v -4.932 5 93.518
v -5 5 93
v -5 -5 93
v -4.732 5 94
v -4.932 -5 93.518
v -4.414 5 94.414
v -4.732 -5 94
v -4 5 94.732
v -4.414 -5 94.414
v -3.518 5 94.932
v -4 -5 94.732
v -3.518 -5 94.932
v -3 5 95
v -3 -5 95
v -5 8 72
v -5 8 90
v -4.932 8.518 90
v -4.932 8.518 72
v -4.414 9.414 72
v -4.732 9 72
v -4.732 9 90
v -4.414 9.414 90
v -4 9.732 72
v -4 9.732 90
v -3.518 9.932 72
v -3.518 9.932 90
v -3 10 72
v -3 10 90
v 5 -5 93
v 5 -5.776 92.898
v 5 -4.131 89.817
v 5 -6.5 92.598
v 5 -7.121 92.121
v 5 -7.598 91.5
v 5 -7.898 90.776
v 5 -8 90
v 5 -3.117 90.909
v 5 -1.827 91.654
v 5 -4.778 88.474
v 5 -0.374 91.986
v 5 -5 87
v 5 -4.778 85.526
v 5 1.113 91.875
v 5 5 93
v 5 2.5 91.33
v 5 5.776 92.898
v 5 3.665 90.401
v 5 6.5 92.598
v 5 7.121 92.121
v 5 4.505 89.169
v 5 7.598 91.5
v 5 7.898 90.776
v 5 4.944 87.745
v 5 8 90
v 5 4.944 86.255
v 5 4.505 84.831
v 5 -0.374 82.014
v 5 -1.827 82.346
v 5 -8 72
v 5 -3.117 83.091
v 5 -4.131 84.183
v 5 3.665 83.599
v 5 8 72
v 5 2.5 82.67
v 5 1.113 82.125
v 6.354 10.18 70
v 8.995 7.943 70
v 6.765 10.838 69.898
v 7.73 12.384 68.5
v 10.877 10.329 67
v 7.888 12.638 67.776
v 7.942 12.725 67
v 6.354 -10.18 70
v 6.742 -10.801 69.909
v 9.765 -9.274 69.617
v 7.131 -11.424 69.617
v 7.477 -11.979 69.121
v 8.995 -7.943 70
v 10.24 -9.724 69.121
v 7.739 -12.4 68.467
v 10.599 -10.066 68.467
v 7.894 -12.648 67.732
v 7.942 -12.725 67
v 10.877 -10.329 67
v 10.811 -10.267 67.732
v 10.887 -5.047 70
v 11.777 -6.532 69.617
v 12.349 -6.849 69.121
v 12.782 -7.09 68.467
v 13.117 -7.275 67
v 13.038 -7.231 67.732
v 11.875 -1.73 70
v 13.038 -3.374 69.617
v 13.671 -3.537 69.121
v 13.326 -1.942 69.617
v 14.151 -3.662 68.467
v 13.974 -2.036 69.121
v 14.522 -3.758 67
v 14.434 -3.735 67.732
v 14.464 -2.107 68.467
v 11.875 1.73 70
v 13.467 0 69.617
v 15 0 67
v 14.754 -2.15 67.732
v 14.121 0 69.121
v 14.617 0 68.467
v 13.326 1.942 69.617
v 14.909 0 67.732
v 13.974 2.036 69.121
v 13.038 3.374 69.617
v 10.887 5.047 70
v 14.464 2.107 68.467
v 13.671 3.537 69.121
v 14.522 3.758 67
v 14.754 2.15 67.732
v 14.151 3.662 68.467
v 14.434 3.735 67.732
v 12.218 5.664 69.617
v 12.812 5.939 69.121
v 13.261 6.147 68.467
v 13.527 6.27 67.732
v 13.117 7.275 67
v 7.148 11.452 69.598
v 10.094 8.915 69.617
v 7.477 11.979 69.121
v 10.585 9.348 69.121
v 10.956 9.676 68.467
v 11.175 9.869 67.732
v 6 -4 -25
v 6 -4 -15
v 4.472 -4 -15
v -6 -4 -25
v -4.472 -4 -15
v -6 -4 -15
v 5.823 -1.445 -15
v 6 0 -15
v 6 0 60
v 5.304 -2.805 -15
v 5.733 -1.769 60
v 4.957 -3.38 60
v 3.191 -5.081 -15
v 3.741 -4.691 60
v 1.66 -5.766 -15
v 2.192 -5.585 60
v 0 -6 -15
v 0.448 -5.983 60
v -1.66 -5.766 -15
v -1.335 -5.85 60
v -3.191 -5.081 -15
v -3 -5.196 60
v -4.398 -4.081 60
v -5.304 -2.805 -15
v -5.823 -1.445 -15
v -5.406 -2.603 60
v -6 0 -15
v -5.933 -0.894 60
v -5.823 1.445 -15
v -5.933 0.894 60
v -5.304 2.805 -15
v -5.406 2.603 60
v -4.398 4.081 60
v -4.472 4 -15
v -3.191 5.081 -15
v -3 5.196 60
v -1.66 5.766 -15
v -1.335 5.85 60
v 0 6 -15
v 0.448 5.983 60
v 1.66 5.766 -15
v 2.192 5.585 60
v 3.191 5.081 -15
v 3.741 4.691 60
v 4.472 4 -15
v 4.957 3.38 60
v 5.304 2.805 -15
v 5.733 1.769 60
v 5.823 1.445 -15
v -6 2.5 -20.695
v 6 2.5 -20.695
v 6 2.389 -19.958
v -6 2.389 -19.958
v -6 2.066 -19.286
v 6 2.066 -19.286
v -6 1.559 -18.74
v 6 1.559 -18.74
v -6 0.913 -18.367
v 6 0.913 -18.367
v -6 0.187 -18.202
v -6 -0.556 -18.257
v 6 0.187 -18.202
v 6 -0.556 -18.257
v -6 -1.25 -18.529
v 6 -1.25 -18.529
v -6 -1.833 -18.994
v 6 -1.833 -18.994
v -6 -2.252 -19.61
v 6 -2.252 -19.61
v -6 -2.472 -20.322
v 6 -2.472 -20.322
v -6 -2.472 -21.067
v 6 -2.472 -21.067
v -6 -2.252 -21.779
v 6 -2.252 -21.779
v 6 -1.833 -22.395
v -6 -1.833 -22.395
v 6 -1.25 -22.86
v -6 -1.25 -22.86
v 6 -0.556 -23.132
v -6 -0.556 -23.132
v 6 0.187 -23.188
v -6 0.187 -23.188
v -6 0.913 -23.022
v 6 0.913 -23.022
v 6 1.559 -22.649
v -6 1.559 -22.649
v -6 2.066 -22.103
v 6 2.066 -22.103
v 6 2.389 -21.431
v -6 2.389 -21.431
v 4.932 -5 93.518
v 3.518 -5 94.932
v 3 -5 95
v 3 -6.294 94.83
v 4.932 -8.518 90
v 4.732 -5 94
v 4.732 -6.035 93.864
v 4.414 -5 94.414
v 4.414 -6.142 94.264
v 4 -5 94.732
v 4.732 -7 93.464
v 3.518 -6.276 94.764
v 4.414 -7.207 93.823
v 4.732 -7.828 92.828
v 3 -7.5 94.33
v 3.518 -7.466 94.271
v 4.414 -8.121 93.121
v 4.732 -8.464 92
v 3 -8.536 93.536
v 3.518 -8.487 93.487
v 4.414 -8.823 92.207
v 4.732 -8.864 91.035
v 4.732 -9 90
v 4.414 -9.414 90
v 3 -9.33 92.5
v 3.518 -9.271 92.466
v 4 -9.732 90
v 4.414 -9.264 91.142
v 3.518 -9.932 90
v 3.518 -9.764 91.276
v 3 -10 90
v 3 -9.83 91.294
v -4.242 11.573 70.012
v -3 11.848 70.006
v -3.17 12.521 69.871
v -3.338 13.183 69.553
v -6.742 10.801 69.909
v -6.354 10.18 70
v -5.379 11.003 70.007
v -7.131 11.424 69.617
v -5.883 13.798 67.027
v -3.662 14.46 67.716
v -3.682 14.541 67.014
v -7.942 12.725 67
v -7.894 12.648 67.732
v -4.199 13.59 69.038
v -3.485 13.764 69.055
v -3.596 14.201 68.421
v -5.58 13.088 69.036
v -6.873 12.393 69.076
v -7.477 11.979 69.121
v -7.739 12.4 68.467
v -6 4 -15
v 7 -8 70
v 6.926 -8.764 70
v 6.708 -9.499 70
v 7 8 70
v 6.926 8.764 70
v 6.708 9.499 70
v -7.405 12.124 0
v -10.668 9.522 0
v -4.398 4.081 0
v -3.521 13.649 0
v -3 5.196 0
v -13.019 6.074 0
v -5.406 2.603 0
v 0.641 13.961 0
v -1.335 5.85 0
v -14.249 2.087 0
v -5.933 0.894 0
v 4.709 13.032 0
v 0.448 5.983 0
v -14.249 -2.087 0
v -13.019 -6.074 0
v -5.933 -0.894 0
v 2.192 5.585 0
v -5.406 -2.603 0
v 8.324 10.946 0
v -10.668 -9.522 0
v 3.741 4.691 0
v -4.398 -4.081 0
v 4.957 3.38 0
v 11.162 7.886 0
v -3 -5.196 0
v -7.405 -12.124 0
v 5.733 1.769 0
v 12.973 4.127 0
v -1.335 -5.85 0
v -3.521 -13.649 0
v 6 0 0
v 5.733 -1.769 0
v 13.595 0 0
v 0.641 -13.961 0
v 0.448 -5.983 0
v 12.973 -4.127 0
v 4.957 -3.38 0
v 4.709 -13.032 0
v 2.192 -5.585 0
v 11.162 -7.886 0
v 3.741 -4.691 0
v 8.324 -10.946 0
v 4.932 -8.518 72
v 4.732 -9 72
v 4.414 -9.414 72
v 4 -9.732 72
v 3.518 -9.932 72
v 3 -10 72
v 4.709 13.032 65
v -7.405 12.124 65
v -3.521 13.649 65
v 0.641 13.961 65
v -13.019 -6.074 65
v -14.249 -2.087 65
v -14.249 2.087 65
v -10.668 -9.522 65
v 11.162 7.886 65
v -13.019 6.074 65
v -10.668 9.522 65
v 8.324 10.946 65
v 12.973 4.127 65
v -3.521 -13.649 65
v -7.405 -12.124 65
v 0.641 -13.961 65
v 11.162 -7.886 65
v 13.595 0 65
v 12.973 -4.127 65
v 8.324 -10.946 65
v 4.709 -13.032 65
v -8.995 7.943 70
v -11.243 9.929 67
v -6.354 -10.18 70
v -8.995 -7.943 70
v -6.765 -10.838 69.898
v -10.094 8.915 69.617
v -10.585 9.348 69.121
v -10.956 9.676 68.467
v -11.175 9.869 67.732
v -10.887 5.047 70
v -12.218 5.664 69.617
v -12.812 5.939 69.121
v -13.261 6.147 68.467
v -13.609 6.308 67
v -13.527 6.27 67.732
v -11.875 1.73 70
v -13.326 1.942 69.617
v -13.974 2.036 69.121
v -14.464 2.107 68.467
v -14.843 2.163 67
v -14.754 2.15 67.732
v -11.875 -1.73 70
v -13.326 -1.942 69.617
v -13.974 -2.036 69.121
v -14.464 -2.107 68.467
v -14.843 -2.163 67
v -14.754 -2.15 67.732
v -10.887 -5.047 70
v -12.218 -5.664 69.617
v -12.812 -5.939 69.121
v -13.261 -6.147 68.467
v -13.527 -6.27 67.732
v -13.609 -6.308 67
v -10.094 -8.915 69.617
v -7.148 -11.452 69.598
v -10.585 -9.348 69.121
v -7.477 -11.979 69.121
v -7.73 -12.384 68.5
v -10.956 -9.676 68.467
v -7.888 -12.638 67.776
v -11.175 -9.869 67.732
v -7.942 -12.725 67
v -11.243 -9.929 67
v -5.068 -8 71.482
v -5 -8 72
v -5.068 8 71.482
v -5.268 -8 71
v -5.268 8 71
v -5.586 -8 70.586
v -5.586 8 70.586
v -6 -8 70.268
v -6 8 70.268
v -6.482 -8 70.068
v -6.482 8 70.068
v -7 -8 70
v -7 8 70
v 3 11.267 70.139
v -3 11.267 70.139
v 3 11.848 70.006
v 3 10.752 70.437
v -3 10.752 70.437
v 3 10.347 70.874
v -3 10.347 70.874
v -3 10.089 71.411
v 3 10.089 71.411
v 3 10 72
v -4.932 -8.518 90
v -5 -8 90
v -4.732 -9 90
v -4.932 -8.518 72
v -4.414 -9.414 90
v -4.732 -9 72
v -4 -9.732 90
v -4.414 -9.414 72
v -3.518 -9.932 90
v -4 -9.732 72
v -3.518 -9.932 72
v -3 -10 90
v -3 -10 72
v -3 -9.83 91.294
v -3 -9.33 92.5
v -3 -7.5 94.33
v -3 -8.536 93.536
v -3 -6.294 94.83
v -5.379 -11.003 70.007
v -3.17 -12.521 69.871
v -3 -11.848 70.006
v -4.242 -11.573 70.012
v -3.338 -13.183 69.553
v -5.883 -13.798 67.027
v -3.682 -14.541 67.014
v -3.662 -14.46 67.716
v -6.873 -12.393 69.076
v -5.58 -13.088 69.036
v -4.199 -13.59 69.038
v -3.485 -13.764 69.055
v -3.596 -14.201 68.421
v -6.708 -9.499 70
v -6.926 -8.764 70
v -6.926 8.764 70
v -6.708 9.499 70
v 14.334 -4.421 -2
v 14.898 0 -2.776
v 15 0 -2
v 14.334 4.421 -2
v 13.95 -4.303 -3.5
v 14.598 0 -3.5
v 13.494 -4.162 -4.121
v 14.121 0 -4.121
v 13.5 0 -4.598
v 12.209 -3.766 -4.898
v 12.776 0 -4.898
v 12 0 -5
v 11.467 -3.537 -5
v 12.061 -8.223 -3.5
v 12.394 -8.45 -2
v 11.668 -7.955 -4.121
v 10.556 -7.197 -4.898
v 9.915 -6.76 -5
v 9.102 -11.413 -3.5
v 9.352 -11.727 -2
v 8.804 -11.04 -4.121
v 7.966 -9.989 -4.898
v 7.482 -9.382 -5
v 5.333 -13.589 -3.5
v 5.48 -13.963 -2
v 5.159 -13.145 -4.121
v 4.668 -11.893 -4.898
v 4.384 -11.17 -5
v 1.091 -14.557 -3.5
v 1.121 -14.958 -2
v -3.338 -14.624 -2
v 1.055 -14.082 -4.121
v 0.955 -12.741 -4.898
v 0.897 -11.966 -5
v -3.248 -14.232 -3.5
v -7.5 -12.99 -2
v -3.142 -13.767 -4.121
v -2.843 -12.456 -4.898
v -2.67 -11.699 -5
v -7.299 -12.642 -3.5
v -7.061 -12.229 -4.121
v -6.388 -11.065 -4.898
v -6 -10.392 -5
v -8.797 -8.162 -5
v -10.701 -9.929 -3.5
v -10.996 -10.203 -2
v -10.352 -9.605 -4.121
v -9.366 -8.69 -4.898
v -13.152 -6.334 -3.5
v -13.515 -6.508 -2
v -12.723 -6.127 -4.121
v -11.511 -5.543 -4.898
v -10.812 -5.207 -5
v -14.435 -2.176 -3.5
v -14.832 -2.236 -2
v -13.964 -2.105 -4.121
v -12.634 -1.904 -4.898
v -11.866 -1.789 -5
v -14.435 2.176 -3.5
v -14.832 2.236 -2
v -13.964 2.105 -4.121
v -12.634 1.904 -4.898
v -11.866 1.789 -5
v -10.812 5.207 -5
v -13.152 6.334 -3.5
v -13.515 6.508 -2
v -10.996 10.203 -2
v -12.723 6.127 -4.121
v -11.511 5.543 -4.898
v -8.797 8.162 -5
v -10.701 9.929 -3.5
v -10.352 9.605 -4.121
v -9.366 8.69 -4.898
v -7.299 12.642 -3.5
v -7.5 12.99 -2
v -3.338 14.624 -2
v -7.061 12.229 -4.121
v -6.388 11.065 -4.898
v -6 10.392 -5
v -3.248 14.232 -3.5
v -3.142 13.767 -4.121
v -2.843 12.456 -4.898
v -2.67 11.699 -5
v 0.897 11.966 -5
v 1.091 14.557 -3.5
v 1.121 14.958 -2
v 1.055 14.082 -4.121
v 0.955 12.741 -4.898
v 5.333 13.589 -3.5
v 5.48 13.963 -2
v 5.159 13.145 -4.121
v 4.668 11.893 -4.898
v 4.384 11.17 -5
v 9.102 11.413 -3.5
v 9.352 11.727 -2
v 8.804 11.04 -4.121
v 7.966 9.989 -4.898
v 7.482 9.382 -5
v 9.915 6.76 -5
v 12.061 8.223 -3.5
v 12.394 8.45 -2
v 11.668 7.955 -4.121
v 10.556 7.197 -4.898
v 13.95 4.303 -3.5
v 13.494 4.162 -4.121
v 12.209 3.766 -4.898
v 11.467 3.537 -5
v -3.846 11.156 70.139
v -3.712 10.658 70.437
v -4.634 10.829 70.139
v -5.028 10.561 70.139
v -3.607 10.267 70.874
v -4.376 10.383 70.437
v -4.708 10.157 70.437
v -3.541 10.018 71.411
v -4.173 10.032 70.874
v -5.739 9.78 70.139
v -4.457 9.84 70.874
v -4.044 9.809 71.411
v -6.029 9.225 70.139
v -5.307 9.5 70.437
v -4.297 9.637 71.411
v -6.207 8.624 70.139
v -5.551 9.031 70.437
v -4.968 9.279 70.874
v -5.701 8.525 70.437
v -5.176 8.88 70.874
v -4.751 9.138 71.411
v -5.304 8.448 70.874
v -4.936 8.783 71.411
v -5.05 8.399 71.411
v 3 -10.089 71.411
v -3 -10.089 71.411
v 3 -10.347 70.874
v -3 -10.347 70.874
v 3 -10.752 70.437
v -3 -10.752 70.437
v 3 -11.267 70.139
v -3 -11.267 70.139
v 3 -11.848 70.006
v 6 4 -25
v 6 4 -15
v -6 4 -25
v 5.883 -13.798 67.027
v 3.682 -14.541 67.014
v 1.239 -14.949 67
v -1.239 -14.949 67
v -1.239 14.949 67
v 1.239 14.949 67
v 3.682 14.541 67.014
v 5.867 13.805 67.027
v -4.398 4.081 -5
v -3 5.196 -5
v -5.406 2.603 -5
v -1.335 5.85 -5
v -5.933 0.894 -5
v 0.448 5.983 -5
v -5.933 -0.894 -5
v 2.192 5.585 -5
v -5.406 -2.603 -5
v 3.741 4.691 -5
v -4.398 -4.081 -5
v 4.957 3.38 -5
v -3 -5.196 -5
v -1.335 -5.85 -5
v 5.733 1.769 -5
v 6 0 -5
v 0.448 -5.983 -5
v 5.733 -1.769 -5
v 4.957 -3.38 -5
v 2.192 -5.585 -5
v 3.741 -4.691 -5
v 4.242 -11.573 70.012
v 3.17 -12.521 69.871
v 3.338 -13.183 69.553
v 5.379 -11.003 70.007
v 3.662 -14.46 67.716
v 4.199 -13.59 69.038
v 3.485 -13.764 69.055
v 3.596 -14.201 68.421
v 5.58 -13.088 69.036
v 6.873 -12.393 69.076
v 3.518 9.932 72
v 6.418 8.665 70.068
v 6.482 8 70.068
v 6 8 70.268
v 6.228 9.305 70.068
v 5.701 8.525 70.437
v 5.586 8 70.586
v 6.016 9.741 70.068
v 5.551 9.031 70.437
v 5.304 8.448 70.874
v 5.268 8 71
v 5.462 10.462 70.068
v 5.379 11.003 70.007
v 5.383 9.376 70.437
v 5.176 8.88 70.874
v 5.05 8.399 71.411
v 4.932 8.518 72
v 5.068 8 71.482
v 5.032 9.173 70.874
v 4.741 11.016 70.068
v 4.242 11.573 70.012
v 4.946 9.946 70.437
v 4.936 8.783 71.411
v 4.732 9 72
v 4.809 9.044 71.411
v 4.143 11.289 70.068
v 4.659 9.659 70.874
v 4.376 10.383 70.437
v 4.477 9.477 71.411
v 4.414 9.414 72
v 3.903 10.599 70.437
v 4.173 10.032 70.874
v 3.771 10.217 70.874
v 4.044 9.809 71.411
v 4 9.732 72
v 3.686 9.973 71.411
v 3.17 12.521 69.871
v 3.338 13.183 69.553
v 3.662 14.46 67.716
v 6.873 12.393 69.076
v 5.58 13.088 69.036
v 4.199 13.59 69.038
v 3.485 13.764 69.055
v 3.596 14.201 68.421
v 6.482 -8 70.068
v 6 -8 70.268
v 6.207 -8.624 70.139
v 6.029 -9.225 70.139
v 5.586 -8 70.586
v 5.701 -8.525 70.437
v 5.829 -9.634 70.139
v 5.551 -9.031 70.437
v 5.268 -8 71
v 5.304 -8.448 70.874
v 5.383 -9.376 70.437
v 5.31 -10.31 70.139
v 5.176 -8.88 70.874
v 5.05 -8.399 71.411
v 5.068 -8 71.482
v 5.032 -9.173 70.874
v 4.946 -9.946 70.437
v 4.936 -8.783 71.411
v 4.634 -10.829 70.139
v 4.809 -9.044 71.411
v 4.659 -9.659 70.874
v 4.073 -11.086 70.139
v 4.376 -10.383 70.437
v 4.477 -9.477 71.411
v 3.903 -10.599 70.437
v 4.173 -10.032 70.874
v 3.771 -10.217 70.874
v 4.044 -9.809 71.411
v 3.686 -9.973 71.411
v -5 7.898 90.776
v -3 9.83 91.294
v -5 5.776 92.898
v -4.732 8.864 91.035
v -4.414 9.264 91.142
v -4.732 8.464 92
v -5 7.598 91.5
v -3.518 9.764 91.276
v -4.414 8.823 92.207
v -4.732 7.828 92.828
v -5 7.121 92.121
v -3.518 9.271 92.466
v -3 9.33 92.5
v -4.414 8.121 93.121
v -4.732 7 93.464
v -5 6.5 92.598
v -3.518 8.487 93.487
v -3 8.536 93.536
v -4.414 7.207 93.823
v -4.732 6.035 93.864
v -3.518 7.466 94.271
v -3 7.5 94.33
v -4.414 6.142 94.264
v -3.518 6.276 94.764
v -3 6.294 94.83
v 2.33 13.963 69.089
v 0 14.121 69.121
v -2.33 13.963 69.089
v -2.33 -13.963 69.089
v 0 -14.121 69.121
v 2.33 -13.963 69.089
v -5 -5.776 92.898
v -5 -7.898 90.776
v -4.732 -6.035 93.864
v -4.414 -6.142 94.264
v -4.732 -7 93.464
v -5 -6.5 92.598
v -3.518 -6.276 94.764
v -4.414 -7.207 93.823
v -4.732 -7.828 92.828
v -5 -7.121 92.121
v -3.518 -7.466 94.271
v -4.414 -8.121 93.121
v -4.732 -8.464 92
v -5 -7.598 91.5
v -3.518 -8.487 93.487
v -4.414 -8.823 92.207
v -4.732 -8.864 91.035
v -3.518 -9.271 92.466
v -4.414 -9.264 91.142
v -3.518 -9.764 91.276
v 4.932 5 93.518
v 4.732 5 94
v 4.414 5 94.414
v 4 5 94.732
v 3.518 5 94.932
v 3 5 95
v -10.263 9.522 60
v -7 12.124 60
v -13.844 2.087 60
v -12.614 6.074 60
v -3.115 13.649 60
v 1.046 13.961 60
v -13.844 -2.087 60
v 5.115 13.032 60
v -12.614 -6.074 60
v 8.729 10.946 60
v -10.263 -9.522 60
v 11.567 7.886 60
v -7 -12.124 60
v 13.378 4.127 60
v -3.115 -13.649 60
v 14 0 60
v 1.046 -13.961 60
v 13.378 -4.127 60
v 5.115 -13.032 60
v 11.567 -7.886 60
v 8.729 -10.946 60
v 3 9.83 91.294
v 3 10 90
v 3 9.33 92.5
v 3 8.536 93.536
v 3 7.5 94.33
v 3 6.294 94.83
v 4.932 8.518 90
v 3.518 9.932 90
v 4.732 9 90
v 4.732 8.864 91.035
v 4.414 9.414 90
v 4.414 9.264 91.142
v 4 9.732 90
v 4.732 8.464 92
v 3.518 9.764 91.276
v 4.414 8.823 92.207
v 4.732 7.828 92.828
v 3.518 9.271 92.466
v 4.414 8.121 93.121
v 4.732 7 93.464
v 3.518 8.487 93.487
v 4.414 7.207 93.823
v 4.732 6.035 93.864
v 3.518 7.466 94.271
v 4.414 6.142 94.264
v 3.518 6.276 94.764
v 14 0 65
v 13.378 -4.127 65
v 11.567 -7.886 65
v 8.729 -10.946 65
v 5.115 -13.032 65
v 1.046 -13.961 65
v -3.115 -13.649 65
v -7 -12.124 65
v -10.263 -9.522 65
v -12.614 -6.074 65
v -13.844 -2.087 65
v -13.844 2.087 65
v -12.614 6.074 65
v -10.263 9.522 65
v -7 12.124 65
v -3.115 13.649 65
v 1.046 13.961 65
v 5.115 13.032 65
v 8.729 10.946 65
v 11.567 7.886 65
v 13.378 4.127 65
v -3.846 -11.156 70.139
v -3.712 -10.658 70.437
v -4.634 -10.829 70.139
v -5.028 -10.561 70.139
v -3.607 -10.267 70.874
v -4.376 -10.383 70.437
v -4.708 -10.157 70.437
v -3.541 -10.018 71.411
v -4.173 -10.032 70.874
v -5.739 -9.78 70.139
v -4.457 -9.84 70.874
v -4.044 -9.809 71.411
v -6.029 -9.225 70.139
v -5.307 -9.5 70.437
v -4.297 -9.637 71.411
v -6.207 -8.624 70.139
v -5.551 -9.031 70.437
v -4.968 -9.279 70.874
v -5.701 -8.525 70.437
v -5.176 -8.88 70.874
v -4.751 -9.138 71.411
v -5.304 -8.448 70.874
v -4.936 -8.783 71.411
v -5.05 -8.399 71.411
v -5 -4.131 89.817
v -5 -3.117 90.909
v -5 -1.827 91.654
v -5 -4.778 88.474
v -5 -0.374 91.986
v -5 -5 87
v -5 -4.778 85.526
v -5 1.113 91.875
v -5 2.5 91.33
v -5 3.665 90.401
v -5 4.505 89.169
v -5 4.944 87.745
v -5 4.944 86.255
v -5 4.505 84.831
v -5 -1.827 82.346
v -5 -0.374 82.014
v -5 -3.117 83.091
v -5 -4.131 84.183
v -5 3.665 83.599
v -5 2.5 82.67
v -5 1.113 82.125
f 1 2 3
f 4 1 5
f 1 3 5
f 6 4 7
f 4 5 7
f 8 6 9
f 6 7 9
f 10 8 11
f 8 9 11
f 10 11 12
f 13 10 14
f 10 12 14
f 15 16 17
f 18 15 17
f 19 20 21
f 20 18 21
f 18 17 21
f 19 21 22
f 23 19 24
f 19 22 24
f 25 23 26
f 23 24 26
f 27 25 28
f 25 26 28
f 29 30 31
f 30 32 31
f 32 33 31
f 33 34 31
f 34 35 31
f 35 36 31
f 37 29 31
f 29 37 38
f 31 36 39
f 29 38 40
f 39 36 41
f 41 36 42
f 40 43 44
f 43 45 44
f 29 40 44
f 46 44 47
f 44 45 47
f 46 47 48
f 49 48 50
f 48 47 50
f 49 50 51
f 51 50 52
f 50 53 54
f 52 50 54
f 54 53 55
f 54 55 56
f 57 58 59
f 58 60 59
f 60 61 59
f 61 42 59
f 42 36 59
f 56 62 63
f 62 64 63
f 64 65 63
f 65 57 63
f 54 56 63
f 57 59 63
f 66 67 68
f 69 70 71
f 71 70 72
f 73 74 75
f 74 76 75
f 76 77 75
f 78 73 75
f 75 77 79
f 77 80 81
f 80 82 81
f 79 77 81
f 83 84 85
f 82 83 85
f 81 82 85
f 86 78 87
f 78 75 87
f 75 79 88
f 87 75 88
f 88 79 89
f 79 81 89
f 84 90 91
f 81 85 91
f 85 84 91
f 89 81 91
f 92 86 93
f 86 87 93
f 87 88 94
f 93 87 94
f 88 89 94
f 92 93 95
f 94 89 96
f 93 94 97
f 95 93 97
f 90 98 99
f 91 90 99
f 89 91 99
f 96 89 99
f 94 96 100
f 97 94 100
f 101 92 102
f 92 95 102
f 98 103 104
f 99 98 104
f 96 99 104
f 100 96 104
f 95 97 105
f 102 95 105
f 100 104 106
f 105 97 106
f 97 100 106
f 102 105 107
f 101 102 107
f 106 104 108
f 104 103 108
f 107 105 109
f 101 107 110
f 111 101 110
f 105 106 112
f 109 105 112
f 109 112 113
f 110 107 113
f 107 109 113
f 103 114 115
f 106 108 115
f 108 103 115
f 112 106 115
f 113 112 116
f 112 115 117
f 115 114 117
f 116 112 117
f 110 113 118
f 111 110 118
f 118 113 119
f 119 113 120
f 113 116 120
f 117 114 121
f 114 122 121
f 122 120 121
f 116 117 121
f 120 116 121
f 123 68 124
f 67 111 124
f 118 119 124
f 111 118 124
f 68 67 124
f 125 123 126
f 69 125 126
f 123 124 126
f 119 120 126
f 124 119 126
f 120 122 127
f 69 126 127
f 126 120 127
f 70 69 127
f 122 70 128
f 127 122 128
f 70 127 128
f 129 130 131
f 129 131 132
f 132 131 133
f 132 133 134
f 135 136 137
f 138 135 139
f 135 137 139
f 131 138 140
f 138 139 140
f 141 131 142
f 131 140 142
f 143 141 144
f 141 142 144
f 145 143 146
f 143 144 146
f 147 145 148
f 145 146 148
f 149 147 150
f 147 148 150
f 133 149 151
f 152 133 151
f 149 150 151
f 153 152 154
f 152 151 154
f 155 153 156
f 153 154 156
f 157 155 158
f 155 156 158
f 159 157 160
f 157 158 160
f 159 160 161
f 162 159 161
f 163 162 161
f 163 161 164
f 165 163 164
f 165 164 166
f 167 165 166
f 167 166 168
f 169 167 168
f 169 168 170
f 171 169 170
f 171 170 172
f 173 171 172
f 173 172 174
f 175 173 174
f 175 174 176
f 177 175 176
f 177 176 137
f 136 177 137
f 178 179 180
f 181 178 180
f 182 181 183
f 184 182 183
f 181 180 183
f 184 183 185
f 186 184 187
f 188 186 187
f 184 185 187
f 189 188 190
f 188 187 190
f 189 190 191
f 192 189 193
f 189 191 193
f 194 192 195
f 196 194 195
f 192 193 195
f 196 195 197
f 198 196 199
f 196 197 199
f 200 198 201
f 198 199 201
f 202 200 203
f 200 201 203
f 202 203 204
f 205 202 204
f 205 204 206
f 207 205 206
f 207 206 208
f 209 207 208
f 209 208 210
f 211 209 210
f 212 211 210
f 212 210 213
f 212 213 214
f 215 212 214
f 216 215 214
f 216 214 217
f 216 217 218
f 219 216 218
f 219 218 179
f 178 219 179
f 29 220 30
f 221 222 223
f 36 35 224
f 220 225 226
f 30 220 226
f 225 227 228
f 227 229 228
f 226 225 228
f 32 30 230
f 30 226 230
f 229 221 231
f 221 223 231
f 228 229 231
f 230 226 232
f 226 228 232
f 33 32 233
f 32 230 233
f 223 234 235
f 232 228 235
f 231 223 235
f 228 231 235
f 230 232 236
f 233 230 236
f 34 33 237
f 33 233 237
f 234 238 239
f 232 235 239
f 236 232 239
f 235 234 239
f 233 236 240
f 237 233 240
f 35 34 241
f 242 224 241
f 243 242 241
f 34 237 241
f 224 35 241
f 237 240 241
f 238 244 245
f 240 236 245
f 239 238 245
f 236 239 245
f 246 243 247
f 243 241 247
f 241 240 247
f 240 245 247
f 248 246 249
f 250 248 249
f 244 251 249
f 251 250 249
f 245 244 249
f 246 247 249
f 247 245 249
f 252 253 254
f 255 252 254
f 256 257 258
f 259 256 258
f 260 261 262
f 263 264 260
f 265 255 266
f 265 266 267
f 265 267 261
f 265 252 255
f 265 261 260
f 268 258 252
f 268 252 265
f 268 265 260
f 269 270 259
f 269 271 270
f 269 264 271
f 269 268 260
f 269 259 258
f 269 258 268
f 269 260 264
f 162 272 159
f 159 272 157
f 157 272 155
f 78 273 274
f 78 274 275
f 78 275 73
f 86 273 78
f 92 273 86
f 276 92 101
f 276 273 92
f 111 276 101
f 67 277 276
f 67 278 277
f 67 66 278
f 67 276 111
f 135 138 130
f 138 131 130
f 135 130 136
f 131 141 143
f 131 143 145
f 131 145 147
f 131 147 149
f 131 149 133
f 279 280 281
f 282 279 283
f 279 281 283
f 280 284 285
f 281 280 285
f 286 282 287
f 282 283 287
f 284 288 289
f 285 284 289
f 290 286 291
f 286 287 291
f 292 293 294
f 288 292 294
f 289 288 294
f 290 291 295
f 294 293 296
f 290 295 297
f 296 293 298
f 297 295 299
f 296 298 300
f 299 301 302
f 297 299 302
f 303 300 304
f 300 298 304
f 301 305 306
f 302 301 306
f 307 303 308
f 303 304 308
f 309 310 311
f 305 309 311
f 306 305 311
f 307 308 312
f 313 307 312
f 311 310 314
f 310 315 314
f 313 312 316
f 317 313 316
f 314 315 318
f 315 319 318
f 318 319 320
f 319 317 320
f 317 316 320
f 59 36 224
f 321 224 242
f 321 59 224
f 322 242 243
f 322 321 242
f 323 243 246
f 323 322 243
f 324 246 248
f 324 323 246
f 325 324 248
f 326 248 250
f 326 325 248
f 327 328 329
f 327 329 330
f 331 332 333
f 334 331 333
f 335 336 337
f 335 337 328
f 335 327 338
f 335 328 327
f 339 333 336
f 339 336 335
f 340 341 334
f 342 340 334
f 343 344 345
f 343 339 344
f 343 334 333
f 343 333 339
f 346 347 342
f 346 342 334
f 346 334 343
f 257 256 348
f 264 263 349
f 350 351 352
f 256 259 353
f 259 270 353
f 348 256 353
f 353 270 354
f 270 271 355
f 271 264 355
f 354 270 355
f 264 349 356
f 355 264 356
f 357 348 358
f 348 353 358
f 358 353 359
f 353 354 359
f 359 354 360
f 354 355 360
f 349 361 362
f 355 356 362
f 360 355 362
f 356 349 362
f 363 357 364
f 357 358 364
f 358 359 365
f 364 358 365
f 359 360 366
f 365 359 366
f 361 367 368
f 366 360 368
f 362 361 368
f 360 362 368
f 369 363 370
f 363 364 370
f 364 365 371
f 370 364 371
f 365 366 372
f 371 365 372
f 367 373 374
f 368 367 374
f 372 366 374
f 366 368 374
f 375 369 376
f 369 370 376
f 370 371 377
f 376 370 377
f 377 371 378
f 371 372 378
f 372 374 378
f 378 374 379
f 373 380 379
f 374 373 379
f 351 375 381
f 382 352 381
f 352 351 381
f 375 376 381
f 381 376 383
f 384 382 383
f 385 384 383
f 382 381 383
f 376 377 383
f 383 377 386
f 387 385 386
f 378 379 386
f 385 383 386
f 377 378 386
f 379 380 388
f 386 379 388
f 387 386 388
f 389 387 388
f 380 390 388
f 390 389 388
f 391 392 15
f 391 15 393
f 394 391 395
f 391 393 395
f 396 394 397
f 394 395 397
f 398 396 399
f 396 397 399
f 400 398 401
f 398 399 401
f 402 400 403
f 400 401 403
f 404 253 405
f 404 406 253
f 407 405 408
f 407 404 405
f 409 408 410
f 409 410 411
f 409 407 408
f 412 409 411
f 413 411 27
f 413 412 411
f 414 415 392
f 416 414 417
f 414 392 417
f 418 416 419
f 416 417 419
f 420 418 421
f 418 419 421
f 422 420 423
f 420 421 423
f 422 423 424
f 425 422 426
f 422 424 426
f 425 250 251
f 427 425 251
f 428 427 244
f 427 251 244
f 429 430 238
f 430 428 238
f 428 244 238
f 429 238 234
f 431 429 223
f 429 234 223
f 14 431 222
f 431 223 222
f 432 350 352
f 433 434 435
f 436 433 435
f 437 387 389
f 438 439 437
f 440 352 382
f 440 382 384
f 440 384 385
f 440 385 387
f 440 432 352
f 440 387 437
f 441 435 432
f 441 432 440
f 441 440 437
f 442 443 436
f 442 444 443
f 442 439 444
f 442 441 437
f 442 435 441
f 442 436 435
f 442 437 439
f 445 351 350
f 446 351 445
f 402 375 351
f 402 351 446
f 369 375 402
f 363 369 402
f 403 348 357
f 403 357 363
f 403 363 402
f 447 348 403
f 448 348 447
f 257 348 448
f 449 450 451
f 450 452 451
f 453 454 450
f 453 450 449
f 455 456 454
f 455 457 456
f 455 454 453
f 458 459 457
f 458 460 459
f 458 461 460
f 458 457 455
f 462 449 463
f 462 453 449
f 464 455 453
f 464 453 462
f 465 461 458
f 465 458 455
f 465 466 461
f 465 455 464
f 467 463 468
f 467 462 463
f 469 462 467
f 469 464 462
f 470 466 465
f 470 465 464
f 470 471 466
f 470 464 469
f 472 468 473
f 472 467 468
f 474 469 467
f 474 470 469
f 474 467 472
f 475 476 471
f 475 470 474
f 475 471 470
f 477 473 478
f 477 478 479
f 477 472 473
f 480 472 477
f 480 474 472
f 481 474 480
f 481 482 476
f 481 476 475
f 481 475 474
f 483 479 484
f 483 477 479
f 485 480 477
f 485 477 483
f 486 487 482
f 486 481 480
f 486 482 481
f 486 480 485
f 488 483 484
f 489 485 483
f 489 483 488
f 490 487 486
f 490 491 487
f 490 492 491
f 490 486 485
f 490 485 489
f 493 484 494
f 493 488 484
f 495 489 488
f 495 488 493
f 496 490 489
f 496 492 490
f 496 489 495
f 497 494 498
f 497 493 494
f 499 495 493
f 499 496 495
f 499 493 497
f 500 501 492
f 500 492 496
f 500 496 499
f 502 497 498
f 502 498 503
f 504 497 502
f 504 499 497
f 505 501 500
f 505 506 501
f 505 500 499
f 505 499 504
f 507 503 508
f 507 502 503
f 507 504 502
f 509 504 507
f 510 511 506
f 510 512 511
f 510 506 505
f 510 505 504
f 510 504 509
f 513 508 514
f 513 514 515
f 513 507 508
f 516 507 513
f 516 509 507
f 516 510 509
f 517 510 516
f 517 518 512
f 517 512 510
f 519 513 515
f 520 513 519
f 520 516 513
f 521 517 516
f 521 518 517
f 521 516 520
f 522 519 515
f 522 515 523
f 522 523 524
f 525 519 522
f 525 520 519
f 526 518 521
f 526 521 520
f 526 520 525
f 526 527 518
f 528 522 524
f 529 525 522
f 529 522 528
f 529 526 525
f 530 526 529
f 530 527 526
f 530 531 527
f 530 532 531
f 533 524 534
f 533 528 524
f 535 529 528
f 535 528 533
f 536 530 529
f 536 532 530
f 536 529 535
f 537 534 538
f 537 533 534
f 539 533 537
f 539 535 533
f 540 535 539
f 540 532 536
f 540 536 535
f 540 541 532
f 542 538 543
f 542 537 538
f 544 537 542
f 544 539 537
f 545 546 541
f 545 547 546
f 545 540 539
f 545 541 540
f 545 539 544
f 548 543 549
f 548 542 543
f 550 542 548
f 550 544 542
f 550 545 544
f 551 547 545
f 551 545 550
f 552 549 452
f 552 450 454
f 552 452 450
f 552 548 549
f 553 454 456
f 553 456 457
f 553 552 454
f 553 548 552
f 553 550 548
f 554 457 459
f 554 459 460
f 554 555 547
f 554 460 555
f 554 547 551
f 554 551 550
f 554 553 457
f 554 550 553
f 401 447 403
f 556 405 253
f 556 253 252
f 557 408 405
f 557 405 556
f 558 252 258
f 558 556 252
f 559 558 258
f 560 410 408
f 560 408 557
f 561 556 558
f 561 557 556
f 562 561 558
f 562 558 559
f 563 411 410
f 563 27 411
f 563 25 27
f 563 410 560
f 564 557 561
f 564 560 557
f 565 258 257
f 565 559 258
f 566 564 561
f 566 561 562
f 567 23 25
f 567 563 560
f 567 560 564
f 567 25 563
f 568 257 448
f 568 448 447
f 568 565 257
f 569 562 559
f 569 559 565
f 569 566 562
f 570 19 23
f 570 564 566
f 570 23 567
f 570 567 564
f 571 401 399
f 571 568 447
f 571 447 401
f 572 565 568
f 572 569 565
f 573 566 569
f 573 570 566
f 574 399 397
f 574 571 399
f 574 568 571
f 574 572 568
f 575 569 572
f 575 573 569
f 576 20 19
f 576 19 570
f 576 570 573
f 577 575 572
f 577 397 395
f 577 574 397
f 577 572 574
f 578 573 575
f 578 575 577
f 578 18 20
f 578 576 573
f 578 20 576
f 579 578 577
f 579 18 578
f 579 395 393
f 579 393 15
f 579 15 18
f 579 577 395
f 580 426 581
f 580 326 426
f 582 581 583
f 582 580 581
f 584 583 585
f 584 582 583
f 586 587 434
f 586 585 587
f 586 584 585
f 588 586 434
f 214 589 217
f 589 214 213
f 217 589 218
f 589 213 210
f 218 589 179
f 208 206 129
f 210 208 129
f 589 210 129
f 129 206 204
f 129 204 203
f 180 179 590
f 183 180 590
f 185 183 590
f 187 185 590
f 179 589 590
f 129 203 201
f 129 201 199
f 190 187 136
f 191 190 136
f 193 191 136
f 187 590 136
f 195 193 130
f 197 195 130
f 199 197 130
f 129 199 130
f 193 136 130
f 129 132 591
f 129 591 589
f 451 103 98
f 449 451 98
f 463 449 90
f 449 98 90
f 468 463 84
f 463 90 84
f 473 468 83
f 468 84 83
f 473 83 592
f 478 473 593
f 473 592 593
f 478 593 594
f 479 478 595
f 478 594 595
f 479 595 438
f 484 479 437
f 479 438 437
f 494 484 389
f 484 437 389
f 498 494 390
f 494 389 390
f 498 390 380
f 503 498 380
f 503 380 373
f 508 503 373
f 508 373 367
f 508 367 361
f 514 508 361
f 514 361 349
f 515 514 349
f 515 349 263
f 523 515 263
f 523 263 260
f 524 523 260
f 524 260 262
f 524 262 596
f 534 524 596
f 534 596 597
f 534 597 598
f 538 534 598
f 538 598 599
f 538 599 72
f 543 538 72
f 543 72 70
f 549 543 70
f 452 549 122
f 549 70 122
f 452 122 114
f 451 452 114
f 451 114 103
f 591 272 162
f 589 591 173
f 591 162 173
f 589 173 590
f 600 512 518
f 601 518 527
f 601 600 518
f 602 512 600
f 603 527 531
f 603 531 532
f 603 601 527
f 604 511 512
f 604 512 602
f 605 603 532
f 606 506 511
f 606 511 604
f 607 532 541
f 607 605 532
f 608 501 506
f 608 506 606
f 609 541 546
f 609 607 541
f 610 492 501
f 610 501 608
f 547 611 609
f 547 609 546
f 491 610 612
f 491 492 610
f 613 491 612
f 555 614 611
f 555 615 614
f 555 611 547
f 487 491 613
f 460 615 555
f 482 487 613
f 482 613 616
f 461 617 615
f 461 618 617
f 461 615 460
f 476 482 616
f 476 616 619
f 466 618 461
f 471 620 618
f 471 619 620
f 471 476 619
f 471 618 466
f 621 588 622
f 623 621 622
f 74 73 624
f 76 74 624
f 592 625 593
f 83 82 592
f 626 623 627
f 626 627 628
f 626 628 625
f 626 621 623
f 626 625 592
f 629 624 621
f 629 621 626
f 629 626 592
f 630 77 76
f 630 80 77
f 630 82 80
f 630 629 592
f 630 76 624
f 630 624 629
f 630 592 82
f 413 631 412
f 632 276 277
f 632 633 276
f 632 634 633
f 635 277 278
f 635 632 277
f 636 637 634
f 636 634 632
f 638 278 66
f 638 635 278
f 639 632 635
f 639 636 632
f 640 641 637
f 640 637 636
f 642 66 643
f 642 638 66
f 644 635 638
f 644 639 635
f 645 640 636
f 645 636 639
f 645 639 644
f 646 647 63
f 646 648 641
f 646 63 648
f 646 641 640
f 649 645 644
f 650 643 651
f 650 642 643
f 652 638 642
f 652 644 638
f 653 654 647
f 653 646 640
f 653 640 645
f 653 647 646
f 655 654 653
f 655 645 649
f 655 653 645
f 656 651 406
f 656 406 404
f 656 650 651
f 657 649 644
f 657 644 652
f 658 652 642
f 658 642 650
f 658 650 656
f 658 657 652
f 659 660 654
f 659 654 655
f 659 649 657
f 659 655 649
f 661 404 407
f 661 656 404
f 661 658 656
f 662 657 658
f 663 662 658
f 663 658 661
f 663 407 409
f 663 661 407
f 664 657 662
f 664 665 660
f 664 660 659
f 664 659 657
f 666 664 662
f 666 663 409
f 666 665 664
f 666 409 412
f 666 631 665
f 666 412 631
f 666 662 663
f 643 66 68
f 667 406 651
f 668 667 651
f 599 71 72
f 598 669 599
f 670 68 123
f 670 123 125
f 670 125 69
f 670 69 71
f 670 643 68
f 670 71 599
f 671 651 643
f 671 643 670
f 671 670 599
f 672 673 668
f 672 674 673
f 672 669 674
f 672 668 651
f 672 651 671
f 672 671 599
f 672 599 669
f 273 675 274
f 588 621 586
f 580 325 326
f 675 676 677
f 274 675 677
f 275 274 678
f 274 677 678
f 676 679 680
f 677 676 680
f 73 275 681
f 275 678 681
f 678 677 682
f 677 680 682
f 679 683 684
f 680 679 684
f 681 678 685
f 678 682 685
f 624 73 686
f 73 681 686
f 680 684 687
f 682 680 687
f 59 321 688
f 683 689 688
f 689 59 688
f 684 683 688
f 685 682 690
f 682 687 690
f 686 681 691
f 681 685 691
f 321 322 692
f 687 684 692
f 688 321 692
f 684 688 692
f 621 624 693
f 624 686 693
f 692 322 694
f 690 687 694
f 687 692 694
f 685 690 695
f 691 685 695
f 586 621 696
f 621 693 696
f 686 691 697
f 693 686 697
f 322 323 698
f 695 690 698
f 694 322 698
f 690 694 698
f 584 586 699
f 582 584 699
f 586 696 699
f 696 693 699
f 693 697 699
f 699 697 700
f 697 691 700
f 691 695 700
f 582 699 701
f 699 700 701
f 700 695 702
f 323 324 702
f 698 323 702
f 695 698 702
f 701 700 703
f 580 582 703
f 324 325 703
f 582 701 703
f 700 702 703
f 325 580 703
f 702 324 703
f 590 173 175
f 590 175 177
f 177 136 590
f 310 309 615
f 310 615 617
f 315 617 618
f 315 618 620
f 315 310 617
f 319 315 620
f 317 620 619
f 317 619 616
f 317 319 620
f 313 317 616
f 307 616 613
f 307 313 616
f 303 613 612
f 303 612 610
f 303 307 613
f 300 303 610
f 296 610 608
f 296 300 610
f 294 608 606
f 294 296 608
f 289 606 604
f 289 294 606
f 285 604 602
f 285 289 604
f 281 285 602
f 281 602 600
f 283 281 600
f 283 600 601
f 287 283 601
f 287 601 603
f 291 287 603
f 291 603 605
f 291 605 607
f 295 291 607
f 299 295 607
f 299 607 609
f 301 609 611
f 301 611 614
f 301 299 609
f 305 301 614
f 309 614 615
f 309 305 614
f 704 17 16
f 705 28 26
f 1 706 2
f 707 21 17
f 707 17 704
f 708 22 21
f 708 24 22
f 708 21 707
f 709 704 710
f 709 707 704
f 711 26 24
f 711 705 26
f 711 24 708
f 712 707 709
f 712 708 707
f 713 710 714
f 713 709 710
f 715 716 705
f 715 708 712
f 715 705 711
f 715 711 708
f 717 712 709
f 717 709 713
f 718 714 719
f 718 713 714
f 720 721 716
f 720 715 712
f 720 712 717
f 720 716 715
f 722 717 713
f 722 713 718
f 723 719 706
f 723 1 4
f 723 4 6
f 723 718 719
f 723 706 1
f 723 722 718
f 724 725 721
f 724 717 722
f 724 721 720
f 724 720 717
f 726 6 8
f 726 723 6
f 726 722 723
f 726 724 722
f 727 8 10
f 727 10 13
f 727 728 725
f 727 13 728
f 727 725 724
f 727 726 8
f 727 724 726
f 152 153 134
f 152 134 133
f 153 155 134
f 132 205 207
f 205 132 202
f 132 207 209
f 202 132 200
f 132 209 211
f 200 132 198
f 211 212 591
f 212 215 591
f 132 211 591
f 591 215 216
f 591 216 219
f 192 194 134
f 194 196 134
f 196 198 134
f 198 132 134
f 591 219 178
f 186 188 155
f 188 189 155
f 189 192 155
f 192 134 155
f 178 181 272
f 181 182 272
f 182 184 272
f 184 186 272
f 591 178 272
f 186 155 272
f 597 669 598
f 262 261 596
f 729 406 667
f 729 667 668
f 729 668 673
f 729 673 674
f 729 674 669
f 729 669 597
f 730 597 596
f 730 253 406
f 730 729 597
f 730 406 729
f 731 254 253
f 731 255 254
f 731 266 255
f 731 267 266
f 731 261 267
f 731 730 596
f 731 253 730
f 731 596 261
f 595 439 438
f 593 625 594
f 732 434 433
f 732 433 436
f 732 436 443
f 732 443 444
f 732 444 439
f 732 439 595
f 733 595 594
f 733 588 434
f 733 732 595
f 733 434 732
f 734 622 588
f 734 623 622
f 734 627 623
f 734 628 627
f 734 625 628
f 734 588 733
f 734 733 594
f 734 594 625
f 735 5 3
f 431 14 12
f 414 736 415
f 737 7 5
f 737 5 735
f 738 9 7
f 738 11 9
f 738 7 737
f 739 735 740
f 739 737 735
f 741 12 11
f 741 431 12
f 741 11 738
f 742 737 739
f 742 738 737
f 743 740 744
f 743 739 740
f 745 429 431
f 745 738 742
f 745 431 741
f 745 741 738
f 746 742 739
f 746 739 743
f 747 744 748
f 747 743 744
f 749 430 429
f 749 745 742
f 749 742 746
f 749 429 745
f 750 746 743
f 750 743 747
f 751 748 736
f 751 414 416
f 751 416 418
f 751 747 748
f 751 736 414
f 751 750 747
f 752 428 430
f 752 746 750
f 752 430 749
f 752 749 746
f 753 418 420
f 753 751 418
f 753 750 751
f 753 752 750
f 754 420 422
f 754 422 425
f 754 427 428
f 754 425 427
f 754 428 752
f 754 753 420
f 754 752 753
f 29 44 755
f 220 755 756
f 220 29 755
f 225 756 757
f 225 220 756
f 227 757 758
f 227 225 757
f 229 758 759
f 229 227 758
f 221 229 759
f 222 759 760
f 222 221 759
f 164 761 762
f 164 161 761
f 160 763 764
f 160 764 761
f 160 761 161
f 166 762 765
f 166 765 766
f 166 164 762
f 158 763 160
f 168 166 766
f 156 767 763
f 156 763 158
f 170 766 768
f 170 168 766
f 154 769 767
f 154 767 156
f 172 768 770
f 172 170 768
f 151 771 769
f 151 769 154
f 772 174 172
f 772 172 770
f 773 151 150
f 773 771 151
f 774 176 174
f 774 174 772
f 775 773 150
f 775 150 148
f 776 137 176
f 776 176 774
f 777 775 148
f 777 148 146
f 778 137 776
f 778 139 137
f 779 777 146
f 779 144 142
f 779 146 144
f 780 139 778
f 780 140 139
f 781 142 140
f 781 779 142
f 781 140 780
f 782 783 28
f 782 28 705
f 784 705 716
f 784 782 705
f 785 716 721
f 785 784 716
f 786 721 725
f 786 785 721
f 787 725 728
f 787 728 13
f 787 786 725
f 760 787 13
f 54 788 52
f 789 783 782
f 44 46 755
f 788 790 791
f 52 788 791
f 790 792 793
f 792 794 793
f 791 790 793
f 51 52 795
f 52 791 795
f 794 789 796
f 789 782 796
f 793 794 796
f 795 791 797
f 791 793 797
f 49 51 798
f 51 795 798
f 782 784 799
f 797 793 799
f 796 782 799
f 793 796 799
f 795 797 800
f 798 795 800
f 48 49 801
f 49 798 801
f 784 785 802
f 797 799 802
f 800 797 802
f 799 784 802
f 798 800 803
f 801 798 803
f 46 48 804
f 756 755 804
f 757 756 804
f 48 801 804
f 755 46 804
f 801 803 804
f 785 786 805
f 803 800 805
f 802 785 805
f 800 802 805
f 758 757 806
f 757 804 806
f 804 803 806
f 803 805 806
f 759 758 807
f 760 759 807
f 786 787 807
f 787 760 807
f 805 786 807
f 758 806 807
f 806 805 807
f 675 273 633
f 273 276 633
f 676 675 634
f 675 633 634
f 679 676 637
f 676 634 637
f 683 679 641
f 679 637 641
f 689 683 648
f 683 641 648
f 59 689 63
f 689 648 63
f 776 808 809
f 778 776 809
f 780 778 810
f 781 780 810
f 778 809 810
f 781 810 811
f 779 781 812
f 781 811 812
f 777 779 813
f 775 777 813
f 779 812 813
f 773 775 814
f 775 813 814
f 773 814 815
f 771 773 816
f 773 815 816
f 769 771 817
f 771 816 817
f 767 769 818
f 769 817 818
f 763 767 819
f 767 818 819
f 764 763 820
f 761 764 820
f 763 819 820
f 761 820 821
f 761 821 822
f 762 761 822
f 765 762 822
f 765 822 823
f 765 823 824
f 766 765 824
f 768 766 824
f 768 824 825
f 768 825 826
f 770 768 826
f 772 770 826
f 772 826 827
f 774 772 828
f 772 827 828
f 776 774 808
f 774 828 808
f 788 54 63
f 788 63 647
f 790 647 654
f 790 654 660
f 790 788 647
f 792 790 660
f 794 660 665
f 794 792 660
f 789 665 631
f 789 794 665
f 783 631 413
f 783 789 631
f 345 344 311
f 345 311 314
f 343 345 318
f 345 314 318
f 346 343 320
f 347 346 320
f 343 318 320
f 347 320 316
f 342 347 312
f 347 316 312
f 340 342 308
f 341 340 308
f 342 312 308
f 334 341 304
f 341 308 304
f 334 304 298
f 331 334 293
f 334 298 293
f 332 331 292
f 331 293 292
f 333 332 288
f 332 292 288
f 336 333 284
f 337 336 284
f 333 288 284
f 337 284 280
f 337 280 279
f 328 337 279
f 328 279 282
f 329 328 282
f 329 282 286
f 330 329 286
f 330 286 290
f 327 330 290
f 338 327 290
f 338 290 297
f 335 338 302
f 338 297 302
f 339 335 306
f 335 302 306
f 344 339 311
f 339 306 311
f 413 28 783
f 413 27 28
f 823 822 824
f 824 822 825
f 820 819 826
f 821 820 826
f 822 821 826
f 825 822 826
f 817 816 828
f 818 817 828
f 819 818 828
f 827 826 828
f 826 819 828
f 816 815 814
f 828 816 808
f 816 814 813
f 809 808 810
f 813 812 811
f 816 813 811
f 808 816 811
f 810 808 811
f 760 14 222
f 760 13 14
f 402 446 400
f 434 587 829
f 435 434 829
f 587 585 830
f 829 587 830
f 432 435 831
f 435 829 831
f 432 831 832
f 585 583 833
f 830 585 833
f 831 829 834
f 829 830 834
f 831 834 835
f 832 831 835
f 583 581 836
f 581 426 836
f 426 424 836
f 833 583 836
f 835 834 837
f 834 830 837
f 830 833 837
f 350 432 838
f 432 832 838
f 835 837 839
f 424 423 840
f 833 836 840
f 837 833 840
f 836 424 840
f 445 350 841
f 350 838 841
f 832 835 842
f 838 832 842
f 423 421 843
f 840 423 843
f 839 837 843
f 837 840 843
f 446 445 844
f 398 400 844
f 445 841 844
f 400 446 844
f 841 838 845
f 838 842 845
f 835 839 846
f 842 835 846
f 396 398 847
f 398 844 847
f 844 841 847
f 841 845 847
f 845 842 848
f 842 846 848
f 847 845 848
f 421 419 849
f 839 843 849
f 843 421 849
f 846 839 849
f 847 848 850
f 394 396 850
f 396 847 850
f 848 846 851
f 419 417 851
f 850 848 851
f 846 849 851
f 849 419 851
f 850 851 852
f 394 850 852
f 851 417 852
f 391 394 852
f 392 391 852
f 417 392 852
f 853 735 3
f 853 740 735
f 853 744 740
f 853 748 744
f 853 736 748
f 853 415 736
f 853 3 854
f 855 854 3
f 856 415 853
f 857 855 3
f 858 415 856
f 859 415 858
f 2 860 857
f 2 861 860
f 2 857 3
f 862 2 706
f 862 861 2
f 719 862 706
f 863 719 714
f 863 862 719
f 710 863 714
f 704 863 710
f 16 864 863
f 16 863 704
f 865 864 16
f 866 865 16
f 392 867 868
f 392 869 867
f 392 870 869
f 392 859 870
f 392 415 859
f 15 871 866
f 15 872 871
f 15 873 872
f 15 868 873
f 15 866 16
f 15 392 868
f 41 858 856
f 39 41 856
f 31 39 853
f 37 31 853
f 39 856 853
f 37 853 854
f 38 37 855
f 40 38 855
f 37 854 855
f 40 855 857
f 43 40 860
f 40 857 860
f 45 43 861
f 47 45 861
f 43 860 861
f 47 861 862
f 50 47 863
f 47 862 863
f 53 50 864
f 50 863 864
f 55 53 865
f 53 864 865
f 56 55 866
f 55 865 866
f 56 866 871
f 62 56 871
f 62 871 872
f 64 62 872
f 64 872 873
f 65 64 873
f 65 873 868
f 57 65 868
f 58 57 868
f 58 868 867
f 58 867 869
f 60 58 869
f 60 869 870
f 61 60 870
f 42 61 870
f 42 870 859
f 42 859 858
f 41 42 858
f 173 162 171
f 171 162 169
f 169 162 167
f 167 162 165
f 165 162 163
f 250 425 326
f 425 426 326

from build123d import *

# Parameters (mm, degrees)
F0_R      = 15
F1_DEPTH  = 70
F2_R      = 14
F3_DEPTH  = 65
F4_R      = 15
F4_R_2    = 14
F4_R_3    = 6
F5_DEPTH  = 5
F6_W      = 10
F6_H      = 20
F7_DEPTH  = 25
F8_R      = 5
F9_DEPTH  = 25
F10_R     = 5
F11_R     = 2
F12_R     = 14
F13_DEPTH = 5
F14_R     = 6
F15_DEPTH = 75
F17_DEPTH = 10
F18_R     = 2.5
F19_DEPTH = 25
F20_R     = 3


with BuildPart() as f1:
    # F0 (on Top) → F1 (new body)
    with BuildSketch(Plane.XY):
        Circle(F0_R)
    extrude(amount=F1_DEPTH)

    # F2 (on face) → F3 (cut)
    with BuildSketch(Plane(origin=(0, 0, 0), x_dir=(1, 0, 0), z_dir=(0, 0, -1))):
        with Locations((-0.4053307348, 0)):
            Circle(F2_R)
    extrude(amount=-F3_DEPTH, mode=Mode.SUBTRACT)

    # F4 (on face) → F5 (join)
    with BuildSketch(Plane(origin=(0, 0, 0), x_dir=(1, 0, 0), z_dir=(0, 0, -1))):
        Circle(F4_R)
        with Locations((-0.4053307348, 0)):
            Circle(F4_R_2, mode=Mode.SUBTRACT)
        with Locations((-0.4053307348, 0)):
            Circle(F4_R_2)
        Circle(F4_R_3, mode=Mode.SUBTRACT)
    extrude(amount=F5_DEPTH)

    # F6 (on face) → F7 (join)
    with BuildSketch(Plane.XY.offset(70)):
        Rectangle(F6_W, F6_H)
    extrude(amount=F7_DEPTH)

    # F8 (on face) → F9 (cut)
    with BuildSketch(Plane(origin=(-5, 0, 0), x_dir=(0, -1, 0), z_dir=(-1, 0, 0))):
        with Locations((0, 87)):
            Circle(F8_R)
    extrude(amount=-F9_DEPTH, mode=Mode.SUBTRACT)

    # F10
    f10_edges = [f1.edges().sort_by_distance(p)[0] for p in [
        (0, 10, 95),
        (0, -10, 95),
    ]]
    fillet(f10_edges, radius=F10_R)

    # F11
    f11_edges = [f1.edges().sort_by_distance(p)[0] for p in [
        (-5, 10, 80),
        (5, 10, 80),
        (5, 0, 70),
        (5, -10, 80),
        (5, -8.535534, 93.535534),
        (5, 0, 95),
        (5, 8.535534, 93.535534),
        (-5, -10, 80),
        (0, -10, 70),
        (-5, -8.535534, 93.535534),
        (0, 10, 70),
        (-5, 0, 70),
        (-5, 0, 95),
        (-5, 8.535534, 93.535534),
    ]]
    fillet(f11_edges, radius=F11_R)

    # F20
    f20_edges = [f1.edges().sort_by_distance(p)[0] for p in [
        (-15, 0, -5),
        (-15, 0, 70),
    ]]
    fillet(f20_edges, radius=F20_R)


with BuildPart() as f13:
    # F12 (on face) → F13 (new body)
    with BuildSketch(Plane(origin=(0, 0, 65), x_dir=(1, 0, 0), z_dir=(0, 0, -1))):
        Circle(F12_R)
    extrude(amount=F13_DEPTH)

    # F14 (on face) → F15 (join)
    with BuildSketch(Plane(origin=(0, 0, 60), x_dir=(1, 0, 0), z_dir=(0, 0, -1))):
        Circle(F14_R)
    extrude(amount=F15_DEPTH)

    # F16 (on face) → F17 (join)
    with BuildSketch(Plane(origin=(0, 0, -15), x_dir=(1, 0, 0), z_dir=(0, 0, -1))):
        with BuildLine():
            Line((6, 0), (6, 4))
            Line((6, 4), (4.472135955, 4))
            ThreePointArc((4.472135955, 4), (5.6050341538, 2.1409325386), (6, 0))
        make_face()
        with BuildLine():
            ThreePointArc((6, 0), (5.6050341538, 2.1409325386), (4.472135955, 4))
            Line((4.472135955, 4), (-4.472135955, 4))
            ThreePointArc((-4.472135955, 4), (-5.6050341538, 2.1409325386), (-6, 0))
            ThreePointArc((-6, 0), (-5.6050341538, -2.1409325386), (-4.472135955, -4))
            Line((-4.472135955, -4), (4.472135955, -4))
            ThreePointArc((4.472135955, -4), (5.6050341538, -2.1409325386), (6, 0))
        make_face()
        with BuildLine():
            ThreePointArc((-6, 0), (-5.6050341538, 2.1409325386), (-4.472135955, 4))
            Line((-4.472135955, 4), (-6, 4))
            Line((-6, 4), (-6, 0))
        make_face()
        with BuildLine():
            ThreePointArc((-4.472135955, -4), (-5.6050341538, -2.1409325386), (-6, 0))
            Line((-6, 0), (-6, -4))
            Line((-6, -4), (-4.472135955, -4))
        make_face()
        with BuildLine():
            Line((6, -4), (6, 0))
            ThreePointArc((6, 0), (5.6050341538, -2.1409325386), (4.472135955, -4))
            Line((4.472135955, -4), (6, -4))
        make_face()
    extrude(amount=F17_DEPTH)

    # F18 (on face) → F19 (cut)
    with BuildSketch(Plane.YZ.offset(6)):
        with Locations((0, -20.694527775)):
            Circle(F18_R)
    extrude(amount=-F19_DEPTH, mode=Mode.SUBTRACT)


solid = Compound([f1.part, f13.part])
